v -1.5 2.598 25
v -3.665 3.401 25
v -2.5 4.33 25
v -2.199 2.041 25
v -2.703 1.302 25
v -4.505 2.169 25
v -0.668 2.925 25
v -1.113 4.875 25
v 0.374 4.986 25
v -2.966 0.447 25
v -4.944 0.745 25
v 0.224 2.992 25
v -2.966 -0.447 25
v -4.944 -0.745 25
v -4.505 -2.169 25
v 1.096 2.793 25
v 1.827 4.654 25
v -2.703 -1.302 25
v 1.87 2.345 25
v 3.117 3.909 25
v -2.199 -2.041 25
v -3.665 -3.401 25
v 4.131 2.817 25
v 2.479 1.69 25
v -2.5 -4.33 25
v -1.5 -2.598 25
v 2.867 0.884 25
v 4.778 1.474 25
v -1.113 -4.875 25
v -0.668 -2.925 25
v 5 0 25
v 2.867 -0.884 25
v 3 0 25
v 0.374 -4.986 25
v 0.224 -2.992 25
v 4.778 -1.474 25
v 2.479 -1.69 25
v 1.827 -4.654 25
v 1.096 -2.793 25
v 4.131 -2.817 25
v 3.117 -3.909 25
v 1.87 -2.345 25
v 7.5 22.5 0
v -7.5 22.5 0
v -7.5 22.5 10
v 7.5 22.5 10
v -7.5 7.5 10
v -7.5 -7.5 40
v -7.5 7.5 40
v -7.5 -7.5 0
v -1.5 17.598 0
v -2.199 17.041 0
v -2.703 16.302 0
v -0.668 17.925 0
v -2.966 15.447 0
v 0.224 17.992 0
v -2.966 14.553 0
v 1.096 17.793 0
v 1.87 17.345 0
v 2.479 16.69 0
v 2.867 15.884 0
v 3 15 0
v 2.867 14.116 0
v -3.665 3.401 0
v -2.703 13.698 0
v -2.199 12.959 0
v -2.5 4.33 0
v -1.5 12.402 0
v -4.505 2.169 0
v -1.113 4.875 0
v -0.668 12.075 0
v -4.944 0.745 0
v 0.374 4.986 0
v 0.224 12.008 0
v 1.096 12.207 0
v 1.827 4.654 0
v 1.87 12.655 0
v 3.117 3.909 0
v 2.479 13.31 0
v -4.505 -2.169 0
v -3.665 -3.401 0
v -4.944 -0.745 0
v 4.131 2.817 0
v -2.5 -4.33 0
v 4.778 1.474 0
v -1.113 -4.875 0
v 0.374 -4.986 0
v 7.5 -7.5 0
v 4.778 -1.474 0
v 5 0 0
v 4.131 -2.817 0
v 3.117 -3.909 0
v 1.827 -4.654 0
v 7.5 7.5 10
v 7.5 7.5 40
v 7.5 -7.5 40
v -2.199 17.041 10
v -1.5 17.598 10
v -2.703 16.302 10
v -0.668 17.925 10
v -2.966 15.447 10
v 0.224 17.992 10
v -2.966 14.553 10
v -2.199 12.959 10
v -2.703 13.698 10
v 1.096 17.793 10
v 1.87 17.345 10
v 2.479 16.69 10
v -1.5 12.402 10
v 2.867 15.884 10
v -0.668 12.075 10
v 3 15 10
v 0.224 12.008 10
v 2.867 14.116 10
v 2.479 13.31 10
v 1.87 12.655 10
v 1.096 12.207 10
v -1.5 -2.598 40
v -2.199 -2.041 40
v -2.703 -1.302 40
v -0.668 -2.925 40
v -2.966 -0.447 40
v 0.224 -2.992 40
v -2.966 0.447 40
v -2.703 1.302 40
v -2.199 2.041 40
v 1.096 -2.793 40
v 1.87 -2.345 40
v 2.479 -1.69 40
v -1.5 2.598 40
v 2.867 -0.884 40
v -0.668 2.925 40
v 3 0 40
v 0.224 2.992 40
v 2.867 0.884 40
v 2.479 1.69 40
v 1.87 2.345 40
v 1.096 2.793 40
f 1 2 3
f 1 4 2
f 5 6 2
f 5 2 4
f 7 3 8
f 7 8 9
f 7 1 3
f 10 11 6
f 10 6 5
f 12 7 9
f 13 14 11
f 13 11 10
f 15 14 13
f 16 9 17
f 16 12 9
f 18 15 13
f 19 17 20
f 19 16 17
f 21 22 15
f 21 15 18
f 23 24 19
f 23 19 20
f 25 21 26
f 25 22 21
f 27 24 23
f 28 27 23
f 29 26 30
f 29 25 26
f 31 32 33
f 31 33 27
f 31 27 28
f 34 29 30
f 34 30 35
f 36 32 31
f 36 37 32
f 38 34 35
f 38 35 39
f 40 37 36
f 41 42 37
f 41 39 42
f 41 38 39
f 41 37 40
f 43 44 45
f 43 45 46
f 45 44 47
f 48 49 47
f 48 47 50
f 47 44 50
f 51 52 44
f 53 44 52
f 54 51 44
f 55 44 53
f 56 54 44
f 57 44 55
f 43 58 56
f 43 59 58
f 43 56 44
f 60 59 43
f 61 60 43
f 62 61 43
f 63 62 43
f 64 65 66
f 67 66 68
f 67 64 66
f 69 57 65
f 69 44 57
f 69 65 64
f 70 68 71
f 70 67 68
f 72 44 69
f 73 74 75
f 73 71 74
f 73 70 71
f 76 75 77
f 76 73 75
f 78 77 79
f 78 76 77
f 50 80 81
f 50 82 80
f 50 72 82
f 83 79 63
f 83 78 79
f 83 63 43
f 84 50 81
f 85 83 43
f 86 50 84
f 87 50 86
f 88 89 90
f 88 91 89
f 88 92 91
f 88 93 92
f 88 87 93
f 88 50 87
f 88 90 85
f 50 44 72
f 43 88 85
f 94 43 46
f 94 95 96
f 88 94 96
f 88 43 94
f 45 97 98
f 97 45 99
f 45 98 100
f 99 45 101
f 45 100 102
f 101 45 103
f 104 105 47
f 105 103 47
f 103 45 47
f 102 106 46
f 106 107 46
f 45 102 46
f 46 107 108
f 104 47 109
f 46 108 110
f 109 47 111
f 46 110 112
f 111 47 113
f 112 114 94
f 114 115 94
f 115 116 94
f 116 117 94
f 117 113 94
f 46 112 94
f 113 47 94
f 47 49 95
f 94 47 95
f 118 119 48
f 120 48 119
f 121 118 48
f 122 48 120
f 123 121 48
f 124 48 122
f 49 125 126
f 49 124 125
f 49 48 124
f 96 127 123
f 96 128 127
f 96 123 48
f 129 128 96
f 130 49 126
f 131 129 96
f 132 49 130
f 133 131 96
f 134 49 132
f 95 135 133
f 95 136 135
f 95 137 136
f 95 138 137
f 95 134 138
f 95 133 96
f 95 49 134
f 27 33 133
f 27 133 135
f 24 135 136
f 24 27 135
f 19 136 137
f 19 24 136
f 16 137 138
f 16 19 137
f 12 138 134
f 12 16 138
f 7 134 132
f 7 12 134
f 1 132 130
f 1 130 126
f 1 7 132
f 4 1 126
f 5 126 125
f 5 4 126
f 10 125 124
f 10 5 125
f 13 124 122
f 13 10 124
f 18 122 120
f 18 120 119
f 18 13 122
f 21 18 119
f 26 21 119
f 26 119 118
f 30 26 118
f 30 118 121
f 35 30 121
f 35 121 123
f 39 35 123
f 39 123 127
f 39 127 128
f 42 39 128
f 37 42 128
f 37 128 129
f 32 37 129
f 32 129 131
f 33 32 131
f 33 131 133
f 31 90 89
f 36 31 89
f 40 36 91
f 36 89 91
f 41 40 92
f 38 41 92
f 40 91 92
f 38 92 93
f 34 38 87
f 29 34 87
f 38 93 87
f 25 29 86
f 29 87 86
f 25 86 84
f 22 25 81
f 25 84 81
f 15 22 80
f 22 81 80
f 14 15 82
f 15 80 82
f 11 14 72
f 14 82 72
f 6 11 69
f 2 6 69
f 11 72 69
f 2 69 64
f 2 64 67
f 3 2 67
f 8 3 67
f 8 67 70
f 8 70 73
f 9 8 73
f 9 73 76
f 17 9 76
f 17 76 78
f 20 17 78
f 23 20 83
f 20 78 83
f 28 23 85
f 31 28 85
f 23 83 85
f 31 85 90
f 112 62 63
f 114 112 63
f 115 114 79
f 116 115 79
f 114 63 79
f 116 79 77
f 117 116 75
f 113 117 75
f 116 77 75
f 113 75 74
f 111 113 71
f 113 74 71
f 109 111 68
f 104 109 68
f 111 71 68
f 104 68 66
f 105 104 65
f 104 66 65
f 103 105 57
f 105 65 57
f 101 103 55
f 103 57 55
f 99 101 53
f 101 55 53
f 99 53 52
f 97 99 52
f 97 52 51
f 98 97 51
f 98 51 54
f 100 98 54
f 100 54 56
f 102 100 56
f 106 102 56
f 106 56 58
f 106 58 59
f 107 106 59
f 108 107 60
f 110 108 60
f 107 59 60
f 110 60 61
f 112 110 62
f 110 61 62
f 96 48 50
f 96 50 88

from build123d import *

# Parameters (mm, degrees)
F0_W     = 15
F0_H     = 15
F0_R     = 3
F1_DEPTH = 40
F2_W     = 15
F2_H     = 15
F2_R     = 3
F3_DEPTH = 10
F4_R     = 5
F5_DEPTH = 25


with BuildPart() as f1:
    # F0 (on Top) → F1 (new body)
    with BuildSketch(Plane.XY):
        Rectangle(F0_W, F0_H)
        Circle(F0_R, mode=Mode.SUBTRACT)
    extrude(amount=F1_DEPTH)

    # F2 (on face) → F3 (join)
    with BuildSketch(Plane(origin=(0, 0, 0), x_dir=(1, 0, 0), z_dir=(0, 0, -1))):
        with Locations((0, -15)):
            Rectangle(F2_W, F2_H)
        with Locations((0, -15)):
            Circle(F2_R, mode=Mode.SUBTRACT)
    extrude(amount=-F3_DEPTH)

    # F4 (on face) → F5 (cut)
    with BuildSketch(Plane(origin=(0, 0, 0), x_dir=(1, 0, 0), z_dir=(0, 0, -1))):
        Circle(F4_R)
    extrude(amount=-F5_DEPTH, mode=Mode.SUBTRACT)


solid = f1.part
